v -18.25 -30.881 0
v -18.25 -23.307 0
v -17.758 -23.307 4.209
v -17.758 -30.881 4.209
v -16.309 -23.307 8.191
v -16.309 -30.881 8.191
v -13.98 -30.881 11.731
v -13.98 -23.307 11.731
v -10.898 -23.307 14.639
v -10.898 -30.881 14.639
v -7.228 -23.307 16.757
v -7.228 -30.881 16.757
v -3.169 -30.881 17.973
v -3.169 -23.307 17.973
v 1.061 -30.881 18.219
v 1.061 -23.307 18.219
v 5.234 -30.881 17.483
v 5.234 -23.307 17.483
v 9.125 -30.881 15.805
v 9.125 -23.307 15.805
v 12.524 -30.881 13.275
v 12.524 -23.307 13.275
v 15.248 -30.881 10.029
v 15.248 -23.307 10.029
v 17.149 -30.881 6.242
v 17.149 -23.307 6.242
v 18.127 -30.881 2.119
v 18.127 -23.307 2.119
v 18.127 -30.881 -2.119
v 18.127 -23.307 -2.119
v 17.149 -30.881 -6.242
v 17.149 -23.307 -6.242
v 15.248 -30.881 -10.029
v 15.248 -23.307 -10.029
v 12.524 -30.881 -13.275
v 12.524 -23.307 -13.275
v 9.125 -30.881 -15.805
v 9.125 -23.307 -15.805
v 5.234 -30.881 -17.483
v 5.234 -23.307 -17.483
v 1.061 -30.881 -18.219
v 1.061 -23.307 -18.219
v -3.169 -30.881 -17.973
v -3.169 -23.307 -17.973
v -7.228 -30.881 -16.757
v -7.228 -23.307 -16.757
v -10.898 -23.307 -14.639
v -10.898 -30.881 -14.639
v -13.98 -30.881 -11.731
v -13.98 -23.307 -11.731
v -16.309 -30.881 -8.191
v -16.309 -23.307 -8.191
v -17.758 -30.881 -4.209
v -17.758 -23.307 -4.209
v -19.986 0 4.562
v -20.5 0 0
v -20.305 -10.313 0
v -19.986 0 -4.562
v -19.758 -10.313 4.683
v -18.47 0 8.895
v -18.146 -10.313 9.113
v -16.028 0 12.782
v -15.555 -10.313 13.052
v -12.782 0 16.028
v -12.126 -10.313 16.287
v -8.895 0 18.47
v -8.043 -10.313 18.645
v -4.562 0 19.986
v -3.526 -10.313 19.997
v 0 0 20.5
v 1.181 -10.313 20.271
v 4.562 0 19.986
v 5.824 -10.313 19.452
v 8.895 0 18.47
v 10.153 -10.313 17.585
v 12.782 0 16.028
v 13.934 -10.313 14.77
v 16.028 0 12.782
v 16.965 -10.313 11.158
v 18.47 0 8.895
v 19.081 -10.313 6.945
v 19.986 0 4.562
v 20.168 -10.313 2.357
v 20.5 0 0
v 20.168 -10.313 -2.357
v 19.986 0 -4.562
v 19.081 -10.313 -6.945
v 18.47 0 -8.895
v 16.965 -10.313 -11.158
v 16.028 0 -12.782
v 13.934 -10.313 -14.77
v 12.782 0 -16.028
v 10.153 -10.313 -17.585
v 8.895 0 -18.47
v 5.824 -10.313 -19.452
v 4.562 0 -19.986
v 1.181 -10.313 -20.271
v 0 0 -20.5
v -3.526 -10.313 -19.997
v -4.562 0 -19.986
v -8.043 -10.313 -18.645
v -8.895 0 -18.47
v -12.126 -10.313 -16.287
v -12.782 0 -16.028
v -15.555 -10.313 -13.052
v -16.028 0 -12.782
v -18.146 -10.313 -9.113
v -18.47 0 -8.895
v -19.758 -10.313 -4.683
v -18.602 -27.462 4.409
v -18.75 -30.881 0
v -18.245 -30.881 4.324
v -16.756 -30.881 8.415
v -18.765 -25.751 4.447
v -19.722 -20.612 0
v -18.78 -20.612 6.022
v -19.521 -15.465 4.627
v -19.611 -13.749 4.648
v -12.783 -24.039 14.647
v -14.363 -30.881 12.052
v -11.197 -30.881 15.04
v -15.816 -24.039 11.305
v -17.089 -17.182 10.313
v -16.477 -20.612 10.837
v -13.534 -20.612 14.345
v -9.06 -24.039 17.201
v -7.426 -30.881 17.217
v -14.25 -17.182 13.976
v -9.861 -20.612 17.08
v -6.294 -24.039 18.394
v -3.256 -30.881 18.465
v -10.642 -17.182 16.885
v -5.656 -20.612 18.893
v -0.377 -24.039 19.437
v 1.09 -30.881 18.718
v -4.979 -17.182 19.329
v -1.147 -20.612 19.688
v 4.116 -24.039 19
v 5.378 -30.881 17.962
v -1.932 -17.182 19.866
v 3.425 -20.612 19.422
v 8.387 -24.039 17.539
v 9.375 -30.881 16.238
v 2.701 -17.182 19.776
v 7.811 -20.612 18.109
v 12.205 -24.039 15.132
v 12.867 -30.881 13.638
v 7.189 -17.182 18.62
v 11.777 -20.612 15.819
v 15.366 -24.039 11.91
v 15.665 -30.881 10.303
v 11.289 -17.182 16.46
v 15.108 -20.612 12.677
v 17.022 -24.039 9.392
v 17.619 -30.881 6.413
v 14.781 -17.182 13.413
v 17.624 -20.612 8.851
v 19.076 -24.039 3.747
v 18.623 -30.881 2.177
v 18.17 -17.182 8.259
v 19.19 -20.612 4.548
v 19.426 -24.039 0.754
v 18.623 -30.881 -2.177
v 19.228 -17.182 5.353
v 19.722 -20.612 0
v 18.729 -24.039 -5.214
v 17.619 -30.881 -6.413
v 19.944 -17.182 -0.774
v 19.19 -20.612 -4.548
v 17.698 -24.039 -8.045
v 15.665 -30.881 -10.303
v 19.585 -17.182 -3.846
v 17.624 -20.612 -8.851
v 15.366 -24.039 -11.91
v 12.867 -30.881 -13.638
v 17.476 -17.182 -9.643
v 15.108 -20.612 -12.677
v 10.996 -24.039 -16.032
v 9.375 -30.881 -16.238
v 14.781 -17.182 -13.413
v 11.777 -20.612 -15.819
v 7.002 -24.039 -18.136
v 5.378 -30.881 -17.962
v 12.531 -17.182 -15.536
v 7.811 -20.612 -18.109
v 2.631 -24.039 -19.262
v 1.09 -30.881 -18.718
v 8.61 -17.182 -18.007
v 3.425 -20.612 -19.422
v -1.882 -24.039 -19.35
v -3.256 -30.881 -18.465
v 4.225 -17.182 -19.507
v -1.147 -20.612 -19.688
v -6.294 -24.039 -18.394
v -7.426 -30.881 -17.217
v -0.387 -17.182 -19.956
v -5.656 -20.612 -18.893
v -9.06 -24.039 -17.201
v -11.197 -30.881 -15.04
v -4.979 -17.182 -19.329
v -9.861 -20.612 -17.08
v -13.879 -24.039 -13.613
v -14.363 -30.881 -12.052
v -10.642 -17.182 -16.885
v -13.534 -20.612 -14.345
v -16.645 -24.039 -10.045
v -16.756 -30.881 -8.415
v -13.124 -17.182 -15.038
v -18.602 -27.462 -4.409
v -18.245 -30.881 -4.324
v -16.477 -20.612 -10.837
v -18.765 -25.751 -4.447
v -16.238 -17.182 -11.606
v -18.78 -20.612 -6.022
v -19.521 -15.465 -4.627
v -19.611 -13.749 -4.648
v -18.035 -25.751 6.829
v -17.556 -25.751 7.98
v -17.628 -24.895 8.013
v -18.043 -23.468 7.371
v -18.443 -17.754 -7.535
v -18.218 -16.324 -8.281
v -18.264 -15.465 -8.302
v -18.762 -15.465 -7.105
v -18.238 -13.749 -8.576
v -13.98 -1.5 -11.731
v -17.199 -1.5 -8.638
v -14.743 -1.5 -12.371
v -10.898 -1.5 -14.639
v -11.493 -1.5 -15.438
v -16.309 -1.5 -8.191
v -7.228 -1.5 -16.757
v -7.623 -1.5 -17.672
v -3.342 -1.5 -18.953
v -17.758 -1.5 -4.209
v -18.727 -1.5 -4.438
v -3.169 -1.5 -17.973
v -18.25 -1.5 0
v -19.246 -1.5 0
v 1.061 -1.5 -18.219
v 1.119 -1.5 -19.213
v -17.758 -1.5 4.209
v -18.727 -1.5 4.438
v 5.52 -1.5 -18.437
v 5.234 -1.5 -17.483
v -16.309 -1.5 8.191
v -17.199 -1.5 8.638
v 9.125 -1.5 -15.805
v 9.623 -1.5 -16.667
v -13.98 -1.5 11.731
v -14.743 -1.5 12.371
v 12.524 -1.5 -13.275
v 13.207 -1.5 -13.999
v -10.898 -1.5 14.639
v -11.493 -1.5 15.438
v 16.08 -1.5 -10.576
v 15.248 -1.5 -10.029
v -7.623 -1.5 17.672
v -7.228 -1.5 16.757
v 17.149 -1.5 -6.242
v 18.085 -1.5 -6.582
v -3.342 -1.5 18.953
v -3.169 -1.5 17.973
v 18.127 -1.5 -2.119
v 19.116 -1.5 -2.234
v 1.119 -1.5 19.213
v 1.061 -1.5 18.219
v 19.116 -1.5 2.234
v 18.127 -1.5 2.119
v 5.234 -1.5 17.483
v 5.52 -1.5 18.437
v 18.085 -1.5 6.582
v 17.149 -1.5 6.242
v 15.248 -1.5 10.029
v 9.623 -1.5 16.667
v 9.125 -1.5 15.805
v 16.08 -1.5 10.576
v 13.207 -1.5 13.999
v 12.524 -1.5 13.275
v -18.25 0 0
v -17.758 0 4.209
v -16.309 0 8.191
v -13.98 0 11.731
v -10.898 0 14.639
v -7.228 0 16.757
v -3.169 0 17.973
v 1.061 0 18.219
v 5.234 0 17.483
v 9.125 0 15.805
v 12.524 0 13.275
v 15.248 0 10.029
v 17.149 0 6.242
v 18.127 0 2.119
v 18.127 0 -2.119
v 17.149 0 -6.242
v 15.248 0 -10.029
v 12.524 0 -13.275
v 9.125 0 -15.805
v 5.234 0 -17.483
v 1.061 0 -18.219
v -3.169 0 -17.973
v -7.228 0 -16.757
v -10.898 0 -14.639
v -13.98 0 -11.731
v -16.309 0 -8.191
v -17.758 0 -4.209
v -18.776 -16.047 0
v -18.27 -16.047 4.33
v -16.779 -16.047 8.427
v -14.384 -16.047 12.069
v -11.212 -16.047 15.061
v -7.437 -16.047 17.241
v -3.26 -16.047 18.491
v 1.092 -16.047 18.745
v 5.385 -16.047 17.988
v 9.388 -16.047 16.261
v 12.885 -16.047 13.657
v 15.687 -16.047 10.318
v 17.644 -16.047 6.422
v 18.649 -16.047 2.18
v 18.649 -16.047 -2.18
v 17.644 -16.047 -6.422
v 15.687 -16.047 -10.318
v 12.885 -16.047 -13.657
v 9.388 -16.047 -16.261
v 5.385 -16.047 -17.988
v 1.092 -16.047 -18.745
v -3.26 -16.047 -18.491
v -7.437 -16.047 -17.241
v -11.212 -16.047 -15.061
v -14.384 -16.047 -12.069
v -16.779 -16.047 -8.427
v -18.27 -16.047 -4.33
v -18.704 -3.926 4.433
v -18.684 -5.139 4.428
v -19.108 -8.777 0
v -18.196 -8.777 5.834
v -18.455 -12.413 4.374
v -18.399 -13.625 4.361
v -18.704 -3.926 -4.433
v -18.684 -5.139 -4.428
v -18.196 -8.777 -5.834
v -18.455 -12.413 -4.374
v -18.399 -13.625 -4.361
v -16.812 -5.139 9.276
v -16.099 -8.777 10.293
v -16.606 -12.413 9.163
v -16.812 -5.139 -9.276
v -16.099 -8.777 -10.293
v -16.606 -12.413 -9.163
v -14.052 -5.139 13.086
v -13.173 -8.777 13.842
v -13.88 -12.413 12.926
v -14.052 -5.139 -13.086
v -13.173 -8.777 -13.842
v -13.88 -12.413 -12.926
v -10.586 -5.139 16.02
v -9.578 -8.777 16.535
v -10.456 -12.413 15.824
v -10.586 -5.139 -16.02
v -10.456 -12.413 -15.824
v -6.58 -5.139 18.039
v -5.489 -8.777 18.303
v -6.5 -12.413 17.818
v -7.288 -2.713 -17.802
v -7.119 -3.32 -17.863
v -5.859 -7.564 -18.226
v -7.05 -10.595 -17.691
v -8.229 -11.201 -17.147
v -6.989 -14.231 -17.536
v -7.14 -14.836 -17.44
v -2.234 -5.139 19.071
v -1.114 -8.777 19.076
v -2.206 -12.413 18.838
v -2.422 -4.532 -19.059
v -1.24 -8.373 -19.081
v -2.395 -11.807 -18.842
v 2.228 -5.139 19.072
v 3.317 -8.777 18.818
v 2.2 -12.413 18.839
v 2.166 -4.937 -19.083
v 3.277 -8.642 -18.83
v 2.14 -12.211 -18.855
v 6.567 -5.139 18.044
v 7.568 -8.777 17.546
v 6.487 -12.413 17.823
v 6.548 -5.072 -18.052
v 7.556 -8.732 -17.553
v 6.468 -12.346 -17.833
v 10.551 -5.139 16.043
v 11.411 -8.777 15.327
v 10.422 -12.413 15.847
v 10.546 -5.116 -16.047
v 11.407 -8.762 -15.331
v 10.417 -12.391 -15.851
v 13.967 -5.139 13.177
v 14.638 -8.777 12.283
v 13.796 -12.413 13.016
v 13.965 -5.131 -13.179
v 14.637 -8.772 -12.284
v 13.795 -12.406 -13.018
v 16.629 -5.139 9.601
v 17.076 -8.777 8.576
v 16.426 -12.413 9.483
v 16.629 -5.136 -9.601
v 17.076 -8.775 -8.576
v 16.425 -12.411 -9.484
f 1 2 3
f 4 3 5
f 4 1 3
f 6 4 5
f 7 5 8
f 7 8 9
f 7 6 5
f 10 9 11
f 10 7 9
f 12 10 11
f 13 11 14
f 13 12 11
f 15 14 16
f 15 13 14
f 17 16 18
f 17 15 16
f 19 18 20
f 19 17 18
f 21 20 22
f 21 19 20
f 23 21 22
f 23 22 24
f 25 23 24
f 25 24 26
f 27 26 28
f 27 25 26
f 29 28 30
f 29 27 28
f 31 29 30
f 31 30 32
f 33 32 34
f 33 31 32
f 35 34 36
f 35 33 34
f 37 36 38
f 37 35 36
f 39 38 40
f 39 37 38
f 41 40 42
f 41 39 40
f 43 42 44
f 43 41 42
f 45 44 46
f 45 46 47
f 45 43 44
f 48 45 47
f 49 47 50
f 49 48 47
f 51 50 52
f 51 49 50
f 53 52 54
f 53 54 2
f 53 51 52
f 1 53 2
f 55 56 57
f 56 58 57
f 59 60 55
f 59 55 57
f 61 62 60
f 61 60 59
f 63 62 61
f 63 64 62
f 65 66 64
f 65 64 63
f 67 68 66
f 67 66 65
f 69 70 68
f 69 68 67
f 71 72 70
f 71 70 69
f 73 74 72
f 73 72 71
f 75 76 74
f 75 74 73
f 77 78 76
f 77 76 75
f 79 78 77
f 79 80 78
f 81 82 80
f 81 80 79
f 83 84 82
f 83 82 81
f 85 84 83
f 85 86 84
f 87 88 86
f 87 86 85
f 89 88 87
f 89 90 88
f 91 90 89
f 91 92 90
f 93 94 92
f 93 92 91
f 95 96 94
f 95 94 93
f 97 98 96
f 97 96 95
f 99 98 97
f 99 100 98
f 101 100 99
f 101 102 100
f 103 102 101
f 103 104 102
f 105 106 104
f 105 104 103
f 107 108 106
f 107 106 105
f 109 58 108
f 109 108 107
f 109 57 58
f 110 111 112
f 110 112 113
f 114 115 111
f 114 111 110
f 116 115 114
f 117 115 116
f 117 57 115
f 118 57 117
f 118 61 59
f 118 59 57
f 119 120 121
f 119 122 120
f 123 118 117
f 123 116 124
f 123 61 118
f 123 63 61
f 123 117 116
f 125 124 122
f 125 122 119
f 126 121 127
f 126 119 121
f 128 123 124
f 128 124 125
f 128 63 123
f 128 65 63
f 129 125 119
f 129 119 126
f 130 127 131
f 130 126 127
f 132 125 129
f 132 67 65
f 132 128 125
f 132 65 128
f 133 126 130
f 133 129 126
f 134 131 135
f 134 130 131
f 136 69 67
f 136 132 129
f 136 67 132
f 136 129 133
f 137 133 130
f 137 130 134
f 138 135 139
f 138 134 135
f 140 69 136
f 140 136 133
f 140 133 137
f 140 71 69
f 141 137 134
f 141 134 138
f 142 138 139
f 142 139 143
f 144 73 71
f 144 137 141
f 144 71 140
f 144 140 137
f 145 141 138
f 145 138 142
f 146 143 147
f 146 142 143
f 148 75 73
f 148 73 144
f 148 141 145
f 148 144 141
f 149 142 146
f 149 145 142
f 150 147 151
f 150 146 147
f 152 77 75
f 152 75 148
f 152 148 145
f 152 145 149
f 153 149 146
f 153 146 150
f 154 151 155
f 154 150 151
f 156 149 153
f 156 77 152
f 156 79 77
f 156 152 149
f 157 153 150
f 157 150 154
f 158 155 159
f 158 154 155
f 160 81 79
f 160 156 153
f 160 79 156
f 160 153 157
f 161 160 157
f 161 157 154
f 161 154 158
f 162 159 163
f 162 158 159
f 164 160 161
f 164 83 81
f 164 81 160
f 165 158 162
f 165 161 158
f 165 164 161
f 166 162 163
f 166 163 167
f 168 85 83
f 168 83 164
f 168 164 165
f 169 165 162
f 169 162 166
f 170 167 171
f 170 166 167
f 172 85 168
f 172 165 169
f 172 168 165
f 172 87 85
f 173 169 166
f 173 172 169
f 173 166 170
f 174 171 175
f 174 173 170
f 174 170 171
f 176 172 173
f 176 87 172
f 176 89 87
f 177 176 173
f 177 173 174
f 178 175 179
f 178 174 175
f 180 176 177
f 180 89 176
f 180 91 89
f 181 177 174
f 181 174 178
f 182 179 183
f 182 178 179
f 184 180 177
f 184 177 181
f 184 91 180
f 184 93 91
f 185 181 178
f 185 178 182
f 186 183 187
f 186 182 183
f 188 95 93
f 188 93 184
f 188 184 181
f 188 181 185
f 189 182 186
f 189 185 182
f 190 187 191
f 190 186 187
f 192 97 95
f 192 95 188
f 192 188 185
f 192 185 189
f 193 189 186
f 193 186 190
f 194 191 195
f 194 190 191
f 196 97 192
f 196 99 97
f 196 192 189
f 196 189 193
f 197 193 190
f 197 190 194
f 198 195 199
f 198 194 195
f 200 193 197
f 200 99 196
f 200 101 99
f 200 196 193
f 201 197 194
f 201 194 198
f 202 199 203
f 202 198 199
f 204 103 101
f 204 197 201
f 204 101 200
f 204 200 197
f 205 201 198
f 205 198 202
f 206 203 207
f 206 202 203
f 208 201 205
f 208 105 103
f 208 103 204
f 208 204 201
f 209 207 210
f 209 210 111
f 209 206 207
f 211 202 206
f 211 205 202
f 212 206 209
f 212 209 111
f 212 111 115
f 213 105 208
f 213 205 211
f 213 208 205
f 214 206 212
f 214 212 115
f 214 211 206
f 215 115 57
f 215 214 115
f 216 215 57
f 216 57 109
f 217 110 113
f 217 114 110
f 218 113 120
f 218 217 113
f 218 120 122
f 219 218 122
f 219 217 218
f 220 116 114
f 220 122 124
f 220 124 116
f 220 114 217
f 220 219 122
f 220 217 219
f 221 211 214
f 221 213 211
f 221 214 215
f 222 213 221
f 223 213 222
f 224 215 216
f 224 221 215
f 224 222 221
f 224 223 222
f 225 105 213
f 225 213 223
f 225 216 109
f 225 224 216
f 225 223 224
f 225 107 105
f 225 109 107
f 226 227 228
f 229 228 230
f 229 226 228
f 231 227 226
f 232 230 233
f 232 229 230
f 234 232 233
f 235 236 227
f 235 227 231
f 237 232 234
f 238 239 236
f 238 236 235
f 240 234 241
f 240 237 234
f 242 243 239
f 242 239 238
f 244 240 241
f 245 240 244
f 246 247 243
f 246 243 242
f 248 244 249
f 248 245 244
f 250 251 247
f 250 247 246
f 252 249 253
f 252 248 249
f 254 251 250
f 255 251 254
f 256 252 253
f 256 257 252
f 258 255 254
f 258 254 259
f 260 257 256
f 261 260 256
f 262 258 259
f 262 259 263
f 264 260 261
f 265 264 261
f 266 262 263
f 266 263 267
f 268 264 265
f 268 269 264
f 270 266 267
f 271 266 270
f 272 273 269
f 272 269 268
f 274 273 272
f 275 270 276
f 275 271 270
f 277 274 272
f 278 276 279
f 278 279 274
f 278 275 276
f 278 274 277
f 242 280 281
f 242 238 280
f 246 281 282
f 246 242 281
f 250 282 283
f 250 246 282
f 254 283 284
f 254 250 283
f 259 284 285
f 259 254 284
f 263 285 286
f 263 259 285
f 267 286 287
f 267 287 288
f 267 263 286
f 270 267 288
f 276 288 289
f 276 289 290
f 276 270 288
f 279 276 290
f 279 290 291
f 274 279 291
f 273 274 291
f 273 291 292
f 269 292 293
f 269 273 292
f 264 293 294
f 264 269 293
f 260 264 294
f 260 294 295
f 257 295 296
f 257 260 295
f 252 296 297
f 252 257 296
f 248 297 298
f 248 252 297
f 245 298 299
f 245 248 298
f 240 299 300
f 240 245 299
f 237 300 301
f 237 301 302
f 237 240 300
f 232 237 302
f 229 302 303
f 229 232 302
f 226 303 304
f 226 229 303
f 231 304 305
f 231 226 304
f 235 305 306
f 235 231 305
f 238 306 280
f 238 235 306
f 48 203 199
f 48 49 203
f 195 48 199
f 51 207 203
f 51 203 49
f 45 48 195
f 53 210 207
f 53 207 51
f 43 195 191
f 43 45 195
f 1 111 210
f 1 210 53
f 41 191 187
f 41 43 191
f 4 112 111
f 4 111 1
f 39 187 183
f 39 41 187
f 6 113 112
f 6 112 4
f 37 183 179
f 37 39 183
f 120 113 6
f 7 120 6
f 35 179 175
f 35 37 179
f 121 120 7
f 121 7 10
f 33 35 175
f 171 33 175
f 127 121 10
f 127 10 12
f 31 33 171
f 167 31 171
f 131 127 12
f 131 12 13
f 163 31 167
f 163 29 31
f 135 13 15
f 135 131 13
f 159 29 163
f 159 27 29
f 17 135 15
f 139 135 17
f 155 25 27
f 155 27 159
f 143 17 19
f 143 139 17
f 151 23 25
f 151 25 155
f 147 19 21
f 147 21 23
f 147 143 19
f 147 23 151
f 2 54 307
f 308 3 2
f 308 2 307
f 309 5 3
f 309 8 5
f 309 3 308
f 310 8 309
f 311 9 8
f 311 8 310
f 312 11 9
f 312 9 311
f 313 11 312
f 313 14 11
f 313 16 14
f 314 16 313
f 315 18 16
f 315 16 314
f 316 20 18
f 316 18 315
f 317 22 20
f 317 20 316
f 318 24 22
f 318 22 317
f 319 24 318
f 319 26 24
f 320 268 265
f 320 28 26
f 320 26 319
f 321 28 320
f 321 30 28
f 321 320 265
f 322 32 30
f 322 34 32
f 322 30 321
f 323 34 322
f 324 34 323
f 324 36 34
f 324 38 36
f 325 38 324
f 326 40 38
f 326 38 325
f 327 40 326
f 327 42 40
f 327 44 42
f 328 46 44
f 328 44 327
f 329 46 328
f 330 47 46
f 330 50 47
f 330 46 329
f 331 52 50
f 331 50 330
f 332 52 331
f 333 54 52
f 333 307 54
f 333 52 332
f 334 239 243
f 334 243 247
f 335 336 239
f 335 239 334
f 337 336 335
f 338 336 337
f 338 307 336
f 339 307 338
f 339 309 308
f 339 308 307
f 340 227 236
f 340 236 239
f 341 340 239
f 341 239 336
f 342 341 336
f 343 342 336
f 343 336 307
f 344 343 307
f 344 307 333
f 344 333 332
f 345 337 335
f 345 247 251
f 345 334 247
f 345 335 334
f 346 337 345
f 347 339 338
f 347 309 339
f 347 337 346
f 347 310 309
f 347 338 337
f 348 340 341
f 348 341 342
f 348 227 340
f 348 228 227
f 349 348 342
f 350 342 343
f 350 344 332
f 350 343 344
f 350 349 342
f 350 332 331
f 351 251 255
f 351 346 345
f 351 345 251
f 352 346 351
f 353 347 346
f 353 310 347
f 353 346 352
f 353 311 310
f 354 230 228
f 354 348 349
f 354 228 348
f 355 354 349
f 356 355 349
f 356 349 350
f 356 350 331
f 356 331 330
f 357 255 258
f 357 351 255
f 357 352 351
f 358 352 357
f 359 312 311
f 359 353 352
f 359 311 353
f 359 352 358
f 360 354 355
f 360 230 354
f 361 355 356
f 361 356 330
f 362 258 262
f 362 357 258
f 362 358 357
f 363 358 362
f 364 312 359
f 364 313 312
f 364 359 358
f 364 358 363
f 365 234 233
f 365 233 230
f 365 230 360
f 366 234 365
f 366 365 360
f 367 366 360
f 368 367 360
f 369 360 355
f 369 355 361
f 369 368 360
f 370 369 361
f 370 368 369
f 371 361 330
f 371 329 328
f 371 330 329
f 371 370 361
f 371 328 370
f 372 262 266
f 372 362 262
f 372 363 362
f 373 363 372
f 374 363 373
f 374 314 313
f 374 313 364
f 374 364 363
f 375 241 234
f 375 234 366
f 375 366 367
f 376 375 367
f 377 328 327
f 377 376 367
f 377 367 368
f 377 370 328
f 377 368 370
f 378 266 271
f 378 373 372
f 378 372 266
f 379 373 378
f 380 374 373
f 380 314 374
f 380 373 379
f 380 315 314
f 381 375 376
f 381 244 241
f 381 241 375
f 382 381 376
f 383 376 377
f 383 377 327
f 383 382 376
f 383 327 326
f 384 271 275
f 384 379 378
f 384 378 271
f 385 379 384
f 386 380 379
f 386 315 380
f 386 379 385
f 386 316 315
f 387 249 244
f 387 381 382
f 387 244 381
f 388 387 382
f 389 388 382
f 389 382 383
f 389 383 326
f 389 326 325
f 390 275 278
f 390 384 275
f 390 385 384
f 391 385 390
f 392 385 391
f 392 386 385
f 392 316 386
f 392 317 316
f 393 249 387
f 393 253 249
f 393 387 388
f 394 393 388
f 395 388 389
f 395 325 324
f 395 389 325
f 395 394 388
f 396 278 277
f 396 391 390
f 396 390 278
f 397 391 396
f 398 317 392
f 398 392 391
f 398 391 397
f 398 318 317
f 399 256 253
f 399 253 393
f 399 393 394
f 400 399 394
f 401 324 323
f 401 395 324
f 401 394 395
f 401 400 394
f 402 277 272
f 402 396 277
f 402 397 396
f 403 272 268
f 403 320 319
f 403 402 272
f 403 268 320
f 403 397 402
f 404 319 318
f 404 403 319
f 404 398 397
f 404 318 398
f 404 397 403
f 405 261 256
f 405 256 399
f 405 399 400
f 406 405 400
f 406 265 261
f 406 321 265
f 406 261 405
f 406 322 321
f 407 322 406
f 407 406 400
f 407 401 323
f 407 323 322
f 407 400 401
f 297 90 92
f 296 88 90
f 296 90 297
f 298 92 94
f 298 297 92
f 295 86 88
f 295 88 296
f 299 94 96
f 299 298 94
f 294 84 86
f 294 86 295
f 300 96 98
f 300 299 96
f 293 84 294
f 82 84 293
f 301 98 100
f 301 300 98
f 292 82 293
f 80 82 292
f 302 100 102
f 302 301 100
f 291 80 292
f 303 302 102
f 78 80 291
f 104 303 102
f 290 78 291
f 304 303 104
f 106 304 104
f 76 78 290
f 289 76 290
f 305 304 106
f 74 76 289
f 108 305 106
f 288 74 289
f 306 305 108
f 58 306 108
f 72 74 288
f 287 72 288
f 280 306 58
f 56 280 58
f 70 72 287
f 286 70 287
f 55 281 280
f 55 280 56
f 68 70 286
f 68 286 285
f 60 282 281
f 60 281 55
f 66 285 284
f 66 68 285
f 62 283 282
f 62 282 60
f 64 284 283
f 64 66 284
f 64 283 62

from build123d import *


with BuildPart() as part:
    # Sketch1 → Revolve1 (revolve)
    with BuildSketch(Plane.XY):
        with BuildLine():
            Line((-20.5, 0), (-18.25, 0))
            Line((-18.25, 0), (-18.25, -1.5))
            Line((-18.25, -1.5), (-19.245865417, -1.5))
            ThreePointArc((-19.245865417, -1.5), (-18.966701987, -12.413256916), (-18.25, -23.306532227))
            Line((-18.25, -23.306532227), (-18.25, -30.881269044))
            Line((-18.25, -30.881269044), (-18.75, -30.881269044))
            ThreePointArc((-18.75, -30.881269044), (-20.062149323, -15.465407187), (-20.5, 0))
        make_face()
    revolve(axis=Axis((0, -1072.800260621, 0), (0, 1, 0)))


solid = part.part
